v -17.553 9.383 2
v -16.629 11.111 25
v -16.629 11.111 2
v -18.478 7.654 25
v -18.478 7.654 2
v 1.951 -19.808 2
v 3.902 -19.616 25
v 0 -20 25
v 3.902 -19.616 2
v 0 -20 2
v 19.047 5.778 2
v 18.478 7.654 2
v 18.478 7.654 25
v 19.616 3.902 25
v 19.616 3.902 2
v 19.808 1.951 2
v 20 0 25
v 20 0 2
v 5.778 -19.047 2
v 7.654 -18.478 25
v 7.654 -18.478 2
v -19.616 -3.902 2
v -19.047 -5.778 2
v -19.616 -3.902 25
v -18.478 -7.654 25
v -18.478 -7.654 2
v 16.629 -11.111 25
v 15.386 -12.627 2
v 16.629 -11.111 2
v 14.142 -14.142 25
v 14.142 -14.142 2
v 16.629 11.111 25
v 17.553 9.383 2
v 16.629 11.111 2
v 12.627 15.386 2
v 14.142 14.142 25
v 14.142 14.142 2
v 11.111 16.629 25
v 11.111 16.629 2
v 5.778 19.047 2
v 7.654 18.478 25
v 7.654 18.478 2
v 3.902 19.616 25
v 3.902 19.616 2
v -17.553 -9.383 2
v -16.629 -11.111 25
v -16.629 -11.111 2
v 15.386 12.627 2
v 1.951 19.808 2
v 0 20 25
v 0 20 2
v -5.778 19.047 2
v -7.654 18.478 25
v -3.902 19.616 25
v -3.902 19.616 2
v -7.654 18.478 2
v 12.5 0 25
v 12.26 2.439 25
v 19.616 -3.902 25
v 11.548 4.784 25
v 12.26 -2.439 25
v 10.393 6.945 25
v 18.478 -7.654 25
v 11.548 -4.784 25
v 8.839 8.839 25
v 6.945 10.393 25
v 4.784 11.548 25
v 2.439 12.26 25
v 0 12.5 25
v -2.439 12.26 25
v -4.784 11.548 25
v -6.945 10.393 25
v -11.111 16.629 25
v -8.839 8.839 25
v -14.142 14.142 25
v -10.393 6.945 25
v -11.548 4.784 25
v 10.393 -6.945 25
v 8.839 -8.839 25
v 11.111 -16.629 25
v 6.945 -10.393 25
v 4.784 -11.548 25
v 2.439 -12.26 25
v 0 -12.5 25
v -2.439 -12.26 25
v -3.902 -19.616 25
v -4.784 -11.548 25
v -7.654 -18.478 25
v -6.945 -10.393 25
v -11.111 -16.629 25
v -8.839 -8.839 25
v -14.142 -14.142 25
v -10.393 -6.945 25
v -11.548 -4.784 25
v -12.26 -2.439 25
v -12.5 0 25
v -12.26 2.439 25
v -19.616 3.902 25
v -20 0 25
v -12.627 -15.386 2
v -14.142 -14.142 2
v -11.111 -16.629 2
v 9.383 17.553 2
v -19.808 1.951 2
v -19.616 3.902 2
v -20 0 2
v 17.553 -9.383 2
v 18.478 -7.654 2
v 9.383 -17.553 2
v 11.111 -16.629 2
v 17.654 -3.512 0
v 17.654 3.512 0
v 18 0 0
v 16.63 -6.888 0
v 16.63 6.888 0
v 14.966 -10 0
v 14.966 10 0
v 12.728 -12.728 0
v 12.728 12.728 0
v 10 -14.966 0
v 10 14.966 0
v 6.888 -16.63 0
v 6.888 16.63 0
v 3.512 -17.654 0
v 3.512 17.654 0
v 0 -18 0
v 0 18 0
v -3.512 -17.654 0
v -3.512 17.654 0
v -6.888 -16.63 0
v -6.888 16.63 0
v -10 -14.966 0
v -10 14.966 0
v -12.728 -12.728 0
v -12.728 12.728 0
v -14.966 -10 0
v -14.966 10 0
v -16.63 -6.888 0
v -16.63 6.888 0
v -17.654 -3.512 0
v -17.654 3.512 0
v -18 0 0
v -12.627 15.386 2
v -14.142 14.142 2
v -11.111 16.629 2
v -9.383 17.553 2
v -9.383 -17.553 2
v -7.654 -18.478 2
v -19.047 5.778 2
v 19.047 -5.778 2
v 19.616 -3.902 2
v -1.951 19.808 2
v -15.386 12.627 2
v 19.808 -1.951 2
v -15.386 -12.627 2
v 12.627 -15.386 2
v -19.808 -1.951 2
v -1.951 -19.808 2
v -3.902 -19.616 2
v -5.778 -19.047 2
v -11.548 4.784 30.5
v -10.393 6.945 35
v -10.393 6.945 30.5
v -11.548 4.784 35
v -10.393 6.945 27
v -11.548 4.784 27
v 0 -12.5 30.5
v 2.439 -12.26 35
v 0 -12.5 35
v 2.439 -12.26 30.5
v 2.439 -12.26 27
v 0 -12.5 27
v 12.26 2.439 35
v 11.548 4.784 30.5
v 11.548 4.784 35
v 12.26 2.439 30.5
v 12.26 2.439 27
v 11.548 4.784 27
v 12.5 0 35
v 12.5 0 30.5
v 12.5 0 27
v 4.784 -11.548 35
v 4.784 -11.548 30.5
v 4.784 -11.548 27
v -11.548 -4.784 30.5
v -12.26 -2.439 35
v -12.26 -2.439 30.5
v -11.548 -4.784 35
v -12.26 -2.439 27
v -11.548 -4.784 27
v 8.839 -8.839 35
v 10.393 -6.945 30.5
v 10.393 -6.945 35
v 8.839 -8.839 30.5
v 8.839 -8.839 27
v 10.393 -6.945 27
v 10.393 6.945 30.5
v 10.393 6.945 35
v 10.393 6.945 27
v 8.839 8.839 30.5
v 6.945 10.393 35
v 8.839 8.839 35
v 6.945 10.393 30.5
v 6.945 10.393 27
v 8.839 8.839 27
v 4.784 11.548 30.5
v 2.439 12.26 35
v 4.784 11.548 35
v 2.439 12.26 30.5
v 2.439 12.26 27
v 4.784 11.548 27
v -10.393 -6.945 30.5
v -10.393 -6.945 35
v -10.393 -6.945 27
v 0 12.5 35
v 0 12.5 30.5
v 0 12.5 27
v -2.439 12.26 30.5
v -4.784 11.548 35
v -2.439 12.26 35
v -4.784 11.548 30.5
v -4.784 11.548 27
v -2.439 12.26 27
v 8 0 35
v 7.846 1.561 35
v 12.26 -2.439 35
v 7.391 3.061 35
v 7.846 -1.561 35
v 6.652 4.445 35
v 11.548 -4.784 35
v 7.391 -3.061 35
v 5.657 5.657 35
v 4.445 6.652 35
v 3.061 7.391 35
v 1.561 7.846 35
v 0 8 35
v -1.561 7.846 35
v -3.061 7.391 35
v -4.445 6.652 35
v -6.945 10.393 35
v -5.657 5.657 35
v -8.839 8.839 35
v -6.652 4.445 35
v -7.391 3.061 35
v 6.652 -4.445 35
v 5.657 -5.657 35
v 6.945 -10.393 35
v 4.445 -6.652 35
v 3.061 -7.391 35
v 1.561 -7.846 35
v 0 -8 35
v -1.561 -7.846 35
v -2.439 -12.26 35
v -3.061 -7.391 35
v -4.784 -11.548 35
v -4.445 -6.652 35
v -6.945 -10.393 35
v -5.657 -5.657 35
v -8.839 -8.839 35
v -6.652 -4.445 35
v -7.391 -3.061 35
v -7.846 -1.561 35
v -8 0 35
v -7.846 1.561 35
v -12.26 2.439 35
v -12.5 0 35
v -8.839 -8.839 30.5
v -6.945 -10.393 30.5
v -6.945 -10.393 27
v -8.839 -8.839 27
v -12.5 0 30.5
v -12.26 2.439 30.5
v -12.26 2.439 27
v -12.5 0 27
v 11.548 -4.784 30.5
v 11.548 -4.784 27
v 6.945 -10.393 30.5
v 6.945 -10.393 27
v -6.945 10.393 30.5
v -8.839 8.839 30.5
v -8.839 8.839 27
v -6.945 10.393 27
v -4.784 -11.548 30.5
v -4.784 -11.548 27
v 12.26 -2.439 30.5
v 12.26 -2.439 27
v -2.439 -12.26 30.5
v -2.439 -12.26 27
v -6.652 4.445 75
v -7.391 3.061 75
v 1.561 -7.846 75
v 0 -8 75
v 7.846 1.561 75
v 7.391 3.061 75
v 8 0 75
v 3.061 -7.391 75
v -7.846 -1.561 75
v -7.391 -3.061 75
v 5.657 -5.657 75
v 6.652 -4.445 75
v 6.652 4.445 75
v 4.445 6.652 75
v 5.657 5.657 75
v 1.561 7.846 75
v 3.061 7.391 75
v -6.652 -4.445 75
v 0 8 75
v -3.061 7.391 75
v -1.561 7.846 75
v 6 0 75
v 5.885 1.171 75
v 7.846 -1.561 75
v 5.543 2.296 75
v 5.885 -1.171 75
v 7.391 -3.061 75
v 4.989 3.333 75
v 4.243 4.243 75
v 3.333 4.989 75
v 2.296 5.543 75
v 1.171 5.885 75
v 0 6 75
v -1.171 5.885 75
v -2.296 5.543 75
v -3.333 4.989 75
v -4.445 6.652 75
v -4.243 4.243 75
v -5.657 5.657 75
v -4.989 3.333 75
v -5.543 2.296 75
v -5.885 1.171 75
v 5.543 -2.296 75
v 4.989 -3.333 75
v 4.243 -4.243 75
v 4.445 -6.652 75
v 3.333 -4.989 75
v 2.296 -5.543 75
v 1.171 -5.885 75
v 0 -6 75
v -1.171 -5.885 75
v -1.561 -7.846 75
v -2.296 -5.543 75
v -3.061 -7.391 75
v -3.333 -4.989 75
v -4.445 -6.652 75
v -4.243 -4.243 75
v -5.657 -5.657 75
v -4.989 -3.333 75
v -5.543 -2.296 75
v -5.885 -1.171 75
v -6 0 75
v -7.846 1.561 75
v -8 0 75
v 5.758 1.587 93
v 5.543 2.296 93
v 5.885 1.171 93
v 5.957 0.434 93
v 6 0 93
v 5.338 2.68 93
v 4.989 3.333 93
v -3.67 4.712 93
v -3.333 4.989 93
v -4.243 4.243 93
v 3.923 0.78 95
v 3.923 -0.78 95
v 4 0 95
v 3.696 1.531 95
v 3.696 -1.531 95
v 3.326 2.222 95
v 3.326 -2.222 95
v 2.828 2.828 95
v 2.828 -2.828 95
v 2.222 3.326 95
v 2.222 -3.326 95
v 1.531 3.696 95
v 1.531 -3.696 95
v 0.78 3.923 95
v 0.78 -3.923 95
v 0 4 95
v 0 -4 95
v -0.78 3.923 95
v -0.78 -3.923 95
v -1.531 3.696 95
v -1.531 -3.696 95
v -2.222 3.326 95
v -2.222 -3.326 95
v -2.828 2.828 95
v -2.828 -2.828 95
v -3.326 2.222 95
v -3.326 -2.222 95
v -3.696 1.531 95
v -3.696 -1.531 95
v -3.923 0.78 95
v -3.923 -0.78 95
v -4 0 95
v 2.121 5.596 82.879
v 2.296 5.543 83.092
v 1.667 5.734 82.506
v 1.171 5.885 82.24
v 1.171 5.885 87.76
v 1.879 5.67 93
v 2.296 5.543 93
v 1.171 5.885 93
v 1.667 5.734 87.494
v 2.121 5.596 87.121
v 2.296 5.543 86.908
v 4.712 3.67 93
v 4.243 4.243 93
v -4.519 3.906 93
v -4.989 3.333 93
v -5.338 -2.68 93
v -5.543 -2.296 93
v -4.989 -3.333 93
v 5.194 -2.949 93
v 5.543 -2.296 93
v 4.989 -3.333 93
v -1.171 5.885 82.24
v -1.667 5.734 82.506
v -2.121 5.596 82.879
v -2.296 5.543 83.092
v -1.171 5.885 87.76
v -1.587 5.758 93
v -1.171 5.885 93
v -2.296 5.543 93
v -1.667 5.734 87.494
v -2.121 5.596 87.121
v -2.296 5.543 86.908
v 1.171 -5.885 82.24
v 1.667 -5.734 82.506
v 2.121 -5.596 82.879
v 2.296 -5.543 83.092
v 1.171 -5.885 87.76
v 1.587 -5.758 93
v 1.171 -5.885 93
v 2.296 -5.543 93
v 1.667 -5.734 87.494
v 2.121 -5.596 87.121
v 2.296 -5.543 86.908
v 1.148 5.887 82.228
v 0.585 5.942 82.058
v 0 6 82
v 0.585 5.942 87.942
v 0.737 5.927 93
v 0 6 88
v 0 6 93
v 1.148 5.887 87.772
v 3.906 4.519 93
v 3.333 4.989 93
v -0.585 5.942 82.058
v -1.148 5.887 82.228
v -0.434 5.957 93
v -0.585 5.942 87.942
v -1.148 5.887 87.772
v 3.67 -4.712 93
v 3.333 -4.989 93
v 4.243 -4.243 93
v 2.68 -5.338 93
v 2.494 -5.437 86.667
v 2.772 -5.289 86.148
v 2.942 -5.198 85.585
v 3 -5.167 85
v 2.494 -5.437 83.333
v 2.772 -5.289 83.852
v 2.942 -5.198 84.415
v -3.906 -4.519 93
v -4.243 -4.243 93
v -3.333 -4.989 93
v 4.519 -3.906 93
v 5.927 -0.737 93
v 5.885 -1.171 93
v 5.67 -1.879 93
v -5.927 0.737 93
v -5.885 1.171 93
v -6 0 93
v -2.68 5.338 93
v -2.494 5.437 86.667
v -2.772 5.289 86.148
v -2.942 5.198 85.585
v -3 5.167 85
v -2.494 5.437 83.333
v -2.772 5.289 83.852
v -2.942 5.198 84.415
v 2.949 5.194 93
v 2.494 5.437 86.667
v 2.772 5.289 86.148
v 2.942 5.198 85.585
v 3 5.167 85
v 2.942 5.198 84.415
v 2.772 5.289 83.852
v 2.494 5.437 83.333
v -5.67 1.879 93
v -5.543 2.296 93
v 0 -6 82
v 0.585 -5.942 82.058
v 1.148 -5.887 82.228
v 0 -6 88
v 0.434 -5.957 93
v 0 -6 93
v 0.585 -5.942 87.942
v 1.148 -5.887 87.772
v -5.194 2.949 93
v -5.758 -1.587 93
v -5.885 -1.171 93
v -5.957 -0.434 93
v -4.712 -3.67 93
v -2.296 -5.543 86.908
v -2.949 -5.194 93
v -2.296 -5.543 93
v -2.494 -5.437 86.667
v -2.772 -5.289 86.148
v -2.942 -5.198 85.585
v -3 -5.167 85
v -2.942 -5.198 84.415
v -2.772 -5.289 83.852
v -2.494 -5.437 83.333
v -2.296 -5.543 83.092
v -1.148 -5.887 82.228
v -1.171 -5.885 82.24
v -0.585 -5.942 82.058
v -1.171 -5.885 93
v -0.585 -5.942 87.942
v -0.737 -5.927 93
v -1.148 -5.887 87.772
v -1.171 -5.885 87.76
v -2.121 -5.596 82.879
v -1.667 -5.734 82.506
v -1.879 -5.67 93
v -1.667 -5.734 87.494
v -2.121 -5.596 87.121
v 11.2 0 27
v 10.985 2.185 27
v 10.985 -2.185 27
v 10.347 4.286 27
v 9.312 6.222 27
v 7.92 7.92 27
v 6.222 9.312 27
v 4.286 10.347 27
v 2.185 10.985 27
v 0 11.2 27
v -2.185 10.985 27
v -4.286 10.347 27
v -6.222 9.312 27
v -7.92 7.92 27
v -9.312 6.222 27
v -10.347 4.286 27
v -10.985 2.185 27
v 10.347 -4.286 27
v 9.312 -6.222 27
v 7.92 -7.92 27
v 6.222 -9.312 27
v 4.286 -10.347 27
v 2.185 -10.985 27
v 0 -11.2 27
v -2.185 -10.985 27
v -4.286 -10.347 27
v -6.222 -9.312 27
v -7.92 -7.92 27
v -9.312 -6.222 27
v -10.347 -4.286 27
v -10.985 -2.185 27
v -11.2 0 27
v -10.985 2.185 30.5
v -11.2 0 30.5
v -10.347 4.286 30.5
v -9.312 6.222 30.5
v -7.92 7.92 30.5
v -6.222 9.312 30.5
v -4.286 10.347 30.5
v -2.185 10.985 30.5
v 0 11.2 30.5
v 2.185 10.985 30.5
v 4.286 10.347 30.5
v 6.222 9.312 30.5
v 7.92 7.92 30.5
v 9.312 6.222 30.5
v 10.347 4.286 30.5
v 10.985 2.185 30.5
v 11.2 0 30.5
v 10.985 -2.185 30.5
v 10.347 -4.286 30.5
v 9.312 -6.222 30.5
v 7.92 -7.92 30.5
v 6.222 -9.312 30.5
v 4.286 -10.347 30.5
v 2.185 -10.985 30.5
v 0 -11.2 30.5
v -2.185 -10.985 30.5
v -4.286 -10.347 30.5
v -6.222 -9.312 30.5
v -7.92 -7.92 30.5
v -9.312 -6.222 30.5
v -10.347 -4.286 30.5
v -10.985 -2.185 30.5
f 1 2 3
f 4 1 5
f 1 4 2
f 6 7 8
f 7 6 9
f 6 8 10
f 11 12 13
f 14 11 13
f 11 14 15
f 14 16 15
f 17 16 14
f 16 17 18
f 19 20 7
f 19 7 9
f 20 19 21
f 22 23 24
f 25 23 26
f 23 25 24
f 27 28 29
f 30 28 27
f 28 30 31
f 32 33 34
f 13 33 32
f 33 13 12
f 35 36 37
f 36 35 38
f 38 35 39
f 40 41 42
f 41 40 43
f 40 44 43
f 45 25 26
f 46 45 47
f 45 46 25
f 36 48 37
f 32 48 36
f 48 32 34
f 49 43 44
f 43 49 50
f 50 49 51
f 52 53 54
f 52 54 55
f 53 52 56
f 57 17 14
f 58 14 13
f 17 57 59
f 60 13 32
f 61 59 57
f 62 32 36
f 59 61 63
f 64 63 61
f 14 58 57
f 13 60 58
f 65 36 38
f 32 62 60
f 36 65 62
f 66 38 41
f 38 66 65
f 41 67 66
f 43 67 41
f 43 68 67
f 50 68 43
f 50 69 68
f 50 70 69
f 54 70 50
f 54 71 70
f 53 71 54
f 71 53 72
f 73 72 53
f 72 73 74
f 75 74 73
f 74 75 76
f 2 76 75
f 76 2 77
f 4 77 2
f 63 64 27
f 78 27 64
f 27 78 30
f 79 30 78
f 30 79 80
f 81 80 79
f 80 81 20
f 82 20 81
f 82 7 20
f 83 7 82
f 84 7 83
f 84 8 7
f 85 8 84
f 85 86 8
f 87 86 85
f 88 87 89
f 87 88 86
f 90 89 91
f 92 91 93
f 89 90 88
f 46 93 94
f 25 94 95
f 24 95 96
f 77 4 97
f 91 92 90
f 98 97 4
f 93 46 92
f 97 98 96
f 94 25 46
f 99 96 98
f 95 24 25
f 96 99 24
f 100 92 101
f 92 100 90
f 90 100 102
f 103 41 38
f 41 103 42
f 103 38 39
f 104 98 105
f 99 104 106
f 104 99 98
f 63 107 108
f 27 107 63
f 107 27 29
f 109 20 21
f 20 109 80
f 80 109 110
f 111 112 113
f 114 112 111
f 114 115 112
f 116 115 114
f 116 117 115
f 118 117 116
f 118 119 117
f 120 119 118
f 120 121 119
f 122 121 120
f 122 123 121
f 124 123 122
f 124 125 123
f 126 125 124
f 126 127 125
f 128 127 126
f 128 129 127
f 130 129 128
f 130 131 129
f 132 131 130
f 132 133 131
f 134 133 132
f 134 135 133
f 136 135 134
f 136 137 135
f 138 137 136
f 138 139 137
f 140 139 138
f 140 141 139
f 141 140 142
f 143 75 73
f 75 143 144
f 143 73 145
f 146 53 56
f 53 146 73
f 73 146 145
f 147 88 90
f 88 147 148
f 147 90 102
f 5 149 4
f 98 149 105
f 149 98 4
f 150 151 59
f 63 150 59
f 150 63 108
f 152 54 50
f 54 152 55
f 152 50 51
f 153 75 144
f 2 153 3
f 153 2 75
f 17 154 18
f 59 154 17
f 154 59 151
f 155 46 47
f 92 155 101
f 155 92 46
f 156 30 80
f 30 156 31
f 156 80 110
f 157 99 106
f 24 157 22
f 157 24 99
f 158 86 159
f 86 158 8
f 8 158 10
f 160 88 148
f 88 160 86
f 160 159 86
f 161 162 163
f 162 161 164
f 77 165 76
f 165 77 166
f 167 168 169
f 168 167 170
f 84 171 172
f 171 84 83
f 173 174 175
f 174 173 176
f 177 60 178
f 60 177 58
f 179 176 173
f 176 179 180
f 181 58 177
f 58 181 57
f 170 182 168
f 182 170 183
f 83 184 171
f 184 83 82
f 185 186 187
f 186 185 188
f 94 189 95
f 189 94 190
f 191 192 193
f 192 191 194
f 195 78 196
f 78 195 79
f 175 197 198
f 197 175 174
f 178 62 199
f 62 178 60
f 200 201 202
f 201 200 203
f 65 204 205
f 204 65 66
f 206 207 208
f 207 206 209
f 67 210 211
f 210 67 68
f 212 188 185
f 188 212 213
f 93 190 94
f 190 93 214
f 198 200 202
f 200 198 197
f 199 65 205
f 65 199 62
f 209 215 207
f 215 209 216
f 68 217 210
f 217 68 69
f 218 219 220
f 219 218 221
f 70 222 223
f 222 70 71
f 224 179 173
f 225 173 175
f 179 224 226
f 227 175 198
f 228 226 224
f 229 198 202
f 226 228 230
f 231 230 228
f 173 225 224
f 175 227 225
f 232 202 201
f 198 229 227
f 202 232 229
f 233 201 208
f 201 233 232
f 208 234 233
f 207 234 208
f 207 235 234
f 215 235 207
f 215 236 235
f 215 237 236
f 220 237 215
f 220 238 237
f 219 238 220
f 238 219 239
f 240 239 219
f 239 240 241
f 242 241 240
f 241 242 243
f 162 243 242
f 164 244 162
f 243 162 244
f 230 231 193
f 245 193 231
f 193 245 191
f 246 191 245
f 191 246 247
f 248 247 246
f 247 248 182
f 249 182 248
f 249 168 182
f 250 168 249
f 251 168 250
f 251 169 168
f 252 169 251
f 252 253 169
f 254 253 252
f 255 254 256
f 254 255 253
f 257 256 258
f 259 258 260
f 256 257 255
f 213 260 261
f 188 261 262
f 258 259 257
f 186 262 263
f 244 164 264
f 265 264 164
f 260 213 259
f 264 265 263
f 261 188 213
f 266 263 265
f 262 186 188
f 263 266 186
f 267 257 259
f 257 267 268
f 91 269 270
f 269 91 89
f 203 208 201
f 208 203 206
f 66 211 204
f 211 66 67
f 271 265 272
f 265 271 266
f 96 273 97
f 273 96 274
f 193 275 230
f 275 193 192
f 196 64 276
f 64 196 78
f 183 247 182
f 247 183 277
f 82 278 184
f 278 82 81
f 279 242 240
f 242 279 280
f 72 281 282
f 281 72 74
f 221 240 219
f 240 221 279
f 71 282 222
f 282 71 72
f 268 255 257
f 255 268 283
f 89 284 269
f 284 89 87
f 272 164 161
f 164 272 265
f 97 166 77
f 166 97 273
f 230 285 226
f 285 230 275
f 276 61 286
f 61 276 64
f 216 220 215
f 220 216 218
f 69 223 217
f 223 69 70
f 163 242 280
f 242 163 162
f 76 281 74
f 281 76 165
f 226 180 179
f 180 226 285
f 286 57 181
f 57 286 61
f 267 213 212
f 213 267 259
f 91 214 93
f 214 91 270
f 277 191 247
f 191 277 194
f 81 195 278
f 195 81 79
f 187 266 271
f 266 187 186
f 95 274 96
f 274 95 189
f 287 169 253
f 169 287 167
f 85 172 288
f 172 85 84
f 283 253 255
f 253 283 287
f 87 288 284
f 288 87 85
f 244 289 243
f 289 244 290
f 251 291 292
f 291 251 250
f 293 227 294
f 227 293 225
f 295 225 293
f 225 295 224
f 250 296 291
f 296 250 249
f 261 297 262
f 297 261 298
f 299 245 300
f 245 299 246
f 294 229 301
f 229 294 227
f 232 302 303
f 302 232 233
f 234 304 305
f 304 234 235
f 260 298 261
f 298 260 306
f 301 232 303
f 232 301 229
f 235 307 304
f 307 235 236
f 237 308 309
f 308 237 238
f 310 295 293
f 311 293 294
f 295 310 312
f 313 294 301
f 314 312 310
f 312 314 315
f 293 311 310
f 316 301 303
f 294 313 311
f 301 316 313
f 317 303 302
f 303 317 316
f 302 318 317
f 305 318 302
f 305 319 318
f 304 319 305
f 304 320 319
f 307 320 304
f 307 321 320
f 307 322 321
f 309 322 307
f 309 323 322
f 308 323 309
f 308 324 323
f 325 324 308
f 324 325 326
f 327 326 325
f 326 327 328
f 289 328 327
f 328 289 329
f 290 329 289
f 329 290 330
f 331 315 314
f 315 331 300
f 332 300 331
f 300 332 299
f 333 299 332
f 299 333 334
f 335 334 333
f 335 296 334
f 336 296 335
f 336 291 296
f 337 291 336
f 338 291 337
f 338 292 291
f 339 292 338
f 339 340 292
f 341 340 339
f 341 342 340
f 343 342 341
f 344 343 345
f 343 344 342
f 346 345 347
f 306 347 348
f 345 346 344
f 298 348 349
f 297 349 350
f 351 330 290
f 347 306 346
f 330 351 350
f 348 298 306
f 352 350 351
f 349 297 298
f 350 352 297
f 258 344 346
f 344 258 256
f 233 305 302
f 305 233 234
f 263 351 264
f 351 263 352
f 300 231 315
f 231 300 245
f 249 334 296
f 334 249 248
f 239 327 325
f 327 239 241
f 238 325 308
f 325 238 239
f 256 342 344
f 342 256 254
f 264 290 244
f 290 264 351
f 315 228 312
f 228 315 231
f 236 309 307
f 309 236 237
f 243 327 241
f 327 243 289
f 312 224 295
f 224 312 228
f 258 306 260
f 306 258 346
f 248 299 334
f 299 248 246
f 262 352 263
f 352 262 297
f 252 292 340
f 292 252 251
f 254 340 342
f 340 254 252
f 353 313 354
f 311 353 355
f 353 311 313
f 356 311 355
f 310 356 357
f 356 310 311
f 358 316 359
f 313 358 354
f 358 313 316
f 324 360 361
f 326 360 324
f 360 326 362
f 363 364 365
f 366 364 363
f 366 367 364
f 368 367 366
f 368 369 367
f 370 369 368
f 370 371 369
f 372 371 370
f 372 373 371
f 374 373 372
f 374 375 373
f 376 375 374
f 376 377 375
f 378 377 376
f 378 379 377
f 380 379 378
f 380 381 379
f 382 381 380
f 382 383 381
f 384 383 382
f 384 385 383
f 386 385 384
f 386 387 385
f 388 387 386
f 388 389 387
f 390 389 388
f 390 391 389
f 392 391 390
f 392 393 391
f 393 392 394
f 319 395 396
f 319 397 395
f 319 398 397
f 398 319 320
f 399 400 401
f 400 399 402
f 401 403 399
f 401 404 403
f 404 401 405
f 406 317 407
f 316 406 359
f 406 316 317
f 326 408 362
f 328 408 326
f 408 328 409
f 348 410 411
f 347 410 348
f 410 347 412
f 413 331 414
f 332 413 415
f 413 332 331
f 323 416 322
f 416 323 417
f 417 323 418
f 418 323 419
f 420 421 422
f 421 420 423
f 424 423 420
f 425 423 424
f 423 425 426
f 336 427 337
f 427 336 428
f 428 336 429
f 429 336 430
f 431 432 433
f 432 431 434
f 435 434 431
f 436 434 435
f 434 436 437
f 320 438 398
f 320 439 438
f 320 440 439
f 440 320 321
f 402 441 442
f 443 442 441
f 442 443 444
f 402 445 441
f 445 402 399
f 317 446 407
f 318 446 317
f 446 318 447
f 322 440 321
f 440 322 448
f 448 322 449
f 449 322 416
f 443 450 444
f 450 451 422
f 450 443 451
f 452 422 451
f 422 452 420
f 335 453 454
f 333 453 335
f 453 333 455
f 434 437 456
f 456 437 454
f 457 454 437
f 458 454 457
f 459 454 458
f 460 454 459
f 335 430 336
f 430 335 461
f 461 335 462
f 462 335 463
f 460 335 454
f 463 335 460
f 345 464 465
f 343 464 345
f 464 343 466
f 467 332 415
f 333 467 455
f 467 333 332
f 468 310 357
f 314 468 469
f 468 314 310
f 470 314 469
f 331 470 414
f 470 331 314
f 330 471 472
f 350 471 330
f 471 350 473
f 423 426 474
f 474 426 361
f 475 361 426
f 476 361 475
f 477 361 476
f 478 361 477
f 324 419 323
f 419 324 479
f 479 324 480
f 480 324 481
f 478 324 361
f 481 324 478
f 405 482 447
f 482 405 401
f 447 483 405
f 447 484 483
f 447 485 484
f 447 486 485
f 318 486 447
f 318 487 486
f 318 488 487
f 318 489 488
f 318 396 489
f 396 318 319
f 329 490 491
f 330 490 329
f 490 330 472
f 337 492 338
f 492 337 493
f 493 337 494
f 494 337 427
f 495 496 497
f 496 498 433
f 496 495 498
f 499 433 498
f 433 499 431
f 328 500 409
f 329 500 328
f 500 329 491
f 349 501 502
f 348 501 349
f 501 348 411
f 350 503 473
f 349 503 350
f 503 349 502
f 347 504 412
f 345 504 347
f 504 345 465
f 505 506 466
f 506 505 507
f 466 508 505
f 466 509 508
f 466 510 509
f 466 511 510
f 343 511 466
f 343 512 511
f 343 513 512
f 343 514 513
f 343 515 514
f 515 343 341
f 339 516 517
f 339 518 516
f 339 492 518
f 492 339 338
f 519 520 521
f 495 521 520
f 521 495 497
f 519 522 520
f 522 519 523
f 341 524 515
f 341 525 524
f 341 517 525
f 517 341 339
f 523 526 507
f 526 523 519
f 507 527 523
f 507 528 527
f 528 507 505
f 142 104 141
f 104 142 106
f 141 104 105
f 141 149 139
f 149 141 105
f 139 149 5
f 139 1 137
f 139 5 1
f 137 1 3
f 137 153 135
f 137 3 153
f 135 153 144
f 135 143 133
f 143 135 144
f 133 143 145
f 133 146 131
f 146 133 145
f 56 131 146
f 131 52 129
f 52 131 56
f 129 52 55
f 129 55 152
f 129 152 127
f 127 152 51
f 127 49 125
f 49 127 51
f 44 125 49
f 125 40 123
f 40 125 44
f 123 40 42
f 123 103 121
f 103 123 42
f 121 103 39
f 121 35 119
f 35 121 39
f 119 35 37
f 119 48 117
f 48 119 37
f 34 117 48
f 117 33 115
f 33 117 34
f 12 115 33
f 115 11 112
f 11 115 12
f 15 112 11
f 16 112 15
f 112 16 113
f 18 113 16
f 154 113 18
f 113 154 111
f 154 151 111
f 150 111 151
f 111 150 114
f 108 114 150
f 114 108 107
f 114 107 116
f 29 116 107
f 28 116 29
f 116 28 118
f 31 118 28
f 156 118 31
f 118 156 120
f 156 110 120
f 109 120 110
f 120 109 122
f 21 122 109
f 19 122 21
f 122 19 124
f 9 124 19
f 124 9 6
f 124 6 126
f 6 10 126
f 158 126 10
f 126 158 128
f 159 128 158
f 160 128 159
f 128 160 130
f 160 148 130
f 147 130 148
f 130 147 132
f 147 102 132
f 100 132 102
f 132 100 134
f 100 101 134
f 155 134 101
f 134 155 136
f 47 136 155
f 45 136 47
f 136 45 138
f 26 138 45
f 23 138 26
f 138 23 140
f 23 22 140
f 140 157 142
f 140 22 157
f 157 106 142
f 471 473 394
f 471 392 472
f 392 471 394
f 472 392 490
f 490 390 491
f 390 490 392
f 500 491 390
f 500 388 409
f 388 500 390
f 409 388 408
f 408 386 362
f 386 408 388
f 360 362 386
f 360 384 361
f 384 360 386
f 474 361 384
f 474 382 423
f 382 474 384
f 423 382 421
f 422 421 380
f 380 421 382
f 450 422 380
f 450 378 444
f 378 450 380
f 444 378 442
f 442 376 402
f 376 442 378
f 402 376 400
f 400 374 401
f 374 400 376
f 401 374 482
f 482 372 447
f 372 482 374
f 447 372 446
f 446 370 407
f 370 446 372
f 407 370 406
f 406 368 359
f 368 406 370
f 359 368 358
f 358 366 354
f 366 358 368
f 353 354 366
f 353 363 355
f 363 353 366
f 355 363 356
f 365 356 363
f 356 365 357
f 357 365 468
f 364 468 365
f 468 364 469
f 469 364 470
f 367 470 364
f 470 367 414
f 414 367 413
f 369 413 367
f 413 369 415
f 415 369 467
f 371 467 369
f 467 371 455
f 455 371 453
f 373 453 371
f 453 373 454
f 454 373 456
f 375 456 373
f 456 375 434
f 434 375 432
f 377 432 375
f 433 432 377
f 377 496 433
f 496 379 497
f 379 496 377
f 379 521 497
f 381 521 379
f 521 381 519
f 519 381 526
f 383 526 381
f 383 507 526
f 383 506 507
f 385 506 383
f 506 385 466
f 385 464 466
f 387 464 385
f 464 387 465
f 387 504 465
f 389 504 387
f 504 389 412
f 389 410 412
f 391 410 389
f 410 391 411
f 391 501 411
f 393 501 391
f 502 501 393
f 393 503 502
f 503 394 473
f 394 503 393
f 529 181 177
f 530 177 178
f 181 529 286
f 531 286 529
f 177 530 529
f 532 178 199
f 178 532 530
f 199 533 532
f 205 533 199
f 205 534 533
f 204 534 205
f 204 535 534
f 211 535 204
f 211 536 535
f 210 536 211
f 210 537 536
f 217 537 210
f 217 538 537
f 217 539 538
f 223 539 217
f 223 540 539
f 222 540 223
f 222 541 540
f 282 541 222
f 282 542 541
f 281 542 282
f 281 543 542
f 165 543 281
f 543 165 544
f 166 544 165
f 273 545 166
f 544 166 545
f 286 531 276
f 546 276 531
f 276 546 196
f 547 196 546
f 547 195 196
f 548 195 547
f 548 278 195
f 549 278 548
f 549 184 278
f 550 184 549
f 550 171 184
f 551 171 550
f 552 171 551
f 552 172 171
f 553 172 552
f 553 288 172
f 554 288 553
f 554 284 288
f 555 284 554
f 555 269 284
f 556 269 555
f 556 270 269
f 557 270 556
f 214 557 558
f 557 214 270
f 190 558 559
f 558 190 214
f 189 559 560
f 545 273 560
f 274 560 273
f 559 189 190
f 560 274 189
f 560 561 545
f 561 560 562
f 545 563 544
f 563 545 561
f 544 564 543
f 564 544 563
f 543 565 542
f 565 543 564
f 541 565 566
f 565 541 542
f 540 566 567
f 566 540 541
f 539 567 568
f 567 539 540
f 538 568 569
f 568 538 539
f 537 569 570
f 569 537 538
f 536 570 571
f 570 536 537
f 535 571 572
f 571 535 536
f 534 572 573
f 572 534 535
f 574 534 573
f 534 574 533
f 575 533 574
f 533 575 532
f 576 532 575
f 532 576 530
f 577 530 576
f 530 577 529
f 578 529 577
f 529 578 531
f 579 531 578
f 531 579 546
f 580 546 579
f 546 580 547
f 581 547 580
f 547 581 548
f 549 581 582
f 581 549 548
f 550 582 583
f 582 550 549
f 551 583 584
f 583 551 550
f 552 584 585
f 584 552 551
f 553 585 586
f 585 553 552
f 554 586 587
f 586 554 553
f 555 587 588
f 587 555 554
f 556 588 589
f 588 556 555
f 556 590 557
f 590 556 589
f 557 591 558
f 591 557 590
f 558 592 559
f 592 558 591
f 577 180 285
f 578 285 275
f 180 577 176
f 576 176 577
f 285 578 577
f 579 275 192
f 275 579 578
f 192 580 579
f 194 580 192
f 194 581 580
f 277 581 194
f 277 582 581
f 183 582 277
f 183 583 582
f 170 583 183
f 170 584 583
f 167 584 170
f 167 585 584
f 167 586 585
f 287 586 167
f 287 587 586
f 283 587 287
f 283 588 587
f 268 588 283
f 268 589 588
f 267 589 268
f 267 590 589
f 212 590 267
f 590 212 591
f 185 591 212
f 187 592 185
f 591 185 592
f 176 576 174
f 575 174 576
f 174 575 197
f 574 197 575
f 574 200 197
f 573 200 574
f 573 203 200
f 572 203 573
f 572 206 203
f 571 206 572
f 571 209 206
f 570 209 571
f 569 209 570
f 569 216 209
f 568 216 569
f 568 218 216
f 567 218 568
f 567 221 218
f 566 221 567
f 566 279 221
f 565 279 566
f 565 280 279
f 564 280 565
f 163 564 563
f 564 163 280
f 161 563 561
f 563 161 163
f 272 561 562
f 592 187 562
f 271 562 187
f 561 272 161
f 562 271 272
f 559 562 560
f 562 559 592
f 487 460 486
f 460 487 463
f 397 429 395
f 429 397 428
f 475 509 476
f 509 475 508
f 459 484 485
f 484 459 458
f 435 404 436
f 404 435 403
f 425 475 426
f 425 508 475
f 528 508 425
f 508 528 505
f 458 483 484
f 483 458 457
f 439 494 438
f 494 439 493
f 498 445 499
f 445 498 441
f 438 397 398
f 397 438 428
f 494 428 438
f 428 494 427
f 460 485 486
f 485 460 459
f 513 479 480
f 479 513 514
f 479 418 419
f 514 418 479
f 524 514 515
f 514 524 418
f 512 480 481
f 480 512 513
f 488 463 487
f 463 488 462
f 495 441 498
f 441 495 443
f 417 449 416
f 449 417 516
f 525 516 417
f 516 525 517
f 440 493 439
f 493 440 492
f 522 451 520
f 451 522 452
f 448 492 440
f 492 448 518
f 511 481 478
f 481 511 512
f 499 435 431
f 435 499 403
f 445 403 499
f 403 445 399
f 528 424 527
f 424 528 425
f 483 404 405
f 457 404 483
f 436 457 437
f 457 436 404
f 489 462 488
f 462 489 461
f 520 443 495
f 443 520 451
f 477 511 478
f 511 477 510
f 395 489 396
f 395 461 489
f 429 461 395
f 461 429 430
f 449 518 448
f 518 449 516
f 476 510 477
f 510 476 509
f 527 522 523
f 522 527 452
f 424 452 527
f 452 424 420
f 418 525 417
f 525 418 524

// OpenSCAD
$fn = 32;

// ----------------------------------------------------------------------
// Stepped shaft: diameters 40, 25, 16, 12 mm, 95 mm long
// ----------------------------------------------------------------------

// --- parameters (mm) ---
d1 = 40;                  // step 1 diameter
len1 = 25;                // step 1 length
d2 = 25;                  // step 2 diameter
len2 = 10;                // step 2 length
d3 = 16;                  // step 3 diameter
len3 = 40;                // step 3 length
d4 = 12;                  // step 4 diameter
len4 = 20;                // step 4 length
total = 95;               // overall length
chamfer = 2;              // end chamfer
groove_r = 12.5;          // groove radius
groove_z = 27;            // groove position from the end
groove_w = 3.5;           // groove width
groove_d = 1.3;           // groove depth
cross_d = 6;              // cross pin hole
cross_z = 85;             // cross hole position

difference() {
  /* turned body: stacked cylinders, every step sunk into the bigger one */
  union() {
    cylinder(h = len1, d = d1);
    translate([0, 0, 24.6]) cylinder(h = 10.4, d = d2);
    translate([0, 0, 34.6]) cylinder(h = 40.4, d = d3);
    translate([0, 0, 74.6]) cylinder(h = 20.4, d = d4);
  }
  /* bottom chamfer ring cut */
  rotate_extrude() translate([18, -2.5]) polygon([[0, 0], [4.5, 0], [4.5, 7], [0, 2.5]]);
  /* top chamfer ring cut */
  rotate_extrude() translate([4, 95]) polygon([[0, 0], [4.5, -4.5], [4.5, 2.5], [0, 2.5]]);
  /* circlip groove just behind the shoulder */
  rotate_extrude() translate([groove_r - groove_d, groove_z]) square([groove_d + 2.5, groove_w]);
  /* cross pin hole through the small step */
  translate([0, 0, cross_z]) rotate([90, 0, 0]) cylinder(h = d4 + 5, d = cross_d, center = true);
}
